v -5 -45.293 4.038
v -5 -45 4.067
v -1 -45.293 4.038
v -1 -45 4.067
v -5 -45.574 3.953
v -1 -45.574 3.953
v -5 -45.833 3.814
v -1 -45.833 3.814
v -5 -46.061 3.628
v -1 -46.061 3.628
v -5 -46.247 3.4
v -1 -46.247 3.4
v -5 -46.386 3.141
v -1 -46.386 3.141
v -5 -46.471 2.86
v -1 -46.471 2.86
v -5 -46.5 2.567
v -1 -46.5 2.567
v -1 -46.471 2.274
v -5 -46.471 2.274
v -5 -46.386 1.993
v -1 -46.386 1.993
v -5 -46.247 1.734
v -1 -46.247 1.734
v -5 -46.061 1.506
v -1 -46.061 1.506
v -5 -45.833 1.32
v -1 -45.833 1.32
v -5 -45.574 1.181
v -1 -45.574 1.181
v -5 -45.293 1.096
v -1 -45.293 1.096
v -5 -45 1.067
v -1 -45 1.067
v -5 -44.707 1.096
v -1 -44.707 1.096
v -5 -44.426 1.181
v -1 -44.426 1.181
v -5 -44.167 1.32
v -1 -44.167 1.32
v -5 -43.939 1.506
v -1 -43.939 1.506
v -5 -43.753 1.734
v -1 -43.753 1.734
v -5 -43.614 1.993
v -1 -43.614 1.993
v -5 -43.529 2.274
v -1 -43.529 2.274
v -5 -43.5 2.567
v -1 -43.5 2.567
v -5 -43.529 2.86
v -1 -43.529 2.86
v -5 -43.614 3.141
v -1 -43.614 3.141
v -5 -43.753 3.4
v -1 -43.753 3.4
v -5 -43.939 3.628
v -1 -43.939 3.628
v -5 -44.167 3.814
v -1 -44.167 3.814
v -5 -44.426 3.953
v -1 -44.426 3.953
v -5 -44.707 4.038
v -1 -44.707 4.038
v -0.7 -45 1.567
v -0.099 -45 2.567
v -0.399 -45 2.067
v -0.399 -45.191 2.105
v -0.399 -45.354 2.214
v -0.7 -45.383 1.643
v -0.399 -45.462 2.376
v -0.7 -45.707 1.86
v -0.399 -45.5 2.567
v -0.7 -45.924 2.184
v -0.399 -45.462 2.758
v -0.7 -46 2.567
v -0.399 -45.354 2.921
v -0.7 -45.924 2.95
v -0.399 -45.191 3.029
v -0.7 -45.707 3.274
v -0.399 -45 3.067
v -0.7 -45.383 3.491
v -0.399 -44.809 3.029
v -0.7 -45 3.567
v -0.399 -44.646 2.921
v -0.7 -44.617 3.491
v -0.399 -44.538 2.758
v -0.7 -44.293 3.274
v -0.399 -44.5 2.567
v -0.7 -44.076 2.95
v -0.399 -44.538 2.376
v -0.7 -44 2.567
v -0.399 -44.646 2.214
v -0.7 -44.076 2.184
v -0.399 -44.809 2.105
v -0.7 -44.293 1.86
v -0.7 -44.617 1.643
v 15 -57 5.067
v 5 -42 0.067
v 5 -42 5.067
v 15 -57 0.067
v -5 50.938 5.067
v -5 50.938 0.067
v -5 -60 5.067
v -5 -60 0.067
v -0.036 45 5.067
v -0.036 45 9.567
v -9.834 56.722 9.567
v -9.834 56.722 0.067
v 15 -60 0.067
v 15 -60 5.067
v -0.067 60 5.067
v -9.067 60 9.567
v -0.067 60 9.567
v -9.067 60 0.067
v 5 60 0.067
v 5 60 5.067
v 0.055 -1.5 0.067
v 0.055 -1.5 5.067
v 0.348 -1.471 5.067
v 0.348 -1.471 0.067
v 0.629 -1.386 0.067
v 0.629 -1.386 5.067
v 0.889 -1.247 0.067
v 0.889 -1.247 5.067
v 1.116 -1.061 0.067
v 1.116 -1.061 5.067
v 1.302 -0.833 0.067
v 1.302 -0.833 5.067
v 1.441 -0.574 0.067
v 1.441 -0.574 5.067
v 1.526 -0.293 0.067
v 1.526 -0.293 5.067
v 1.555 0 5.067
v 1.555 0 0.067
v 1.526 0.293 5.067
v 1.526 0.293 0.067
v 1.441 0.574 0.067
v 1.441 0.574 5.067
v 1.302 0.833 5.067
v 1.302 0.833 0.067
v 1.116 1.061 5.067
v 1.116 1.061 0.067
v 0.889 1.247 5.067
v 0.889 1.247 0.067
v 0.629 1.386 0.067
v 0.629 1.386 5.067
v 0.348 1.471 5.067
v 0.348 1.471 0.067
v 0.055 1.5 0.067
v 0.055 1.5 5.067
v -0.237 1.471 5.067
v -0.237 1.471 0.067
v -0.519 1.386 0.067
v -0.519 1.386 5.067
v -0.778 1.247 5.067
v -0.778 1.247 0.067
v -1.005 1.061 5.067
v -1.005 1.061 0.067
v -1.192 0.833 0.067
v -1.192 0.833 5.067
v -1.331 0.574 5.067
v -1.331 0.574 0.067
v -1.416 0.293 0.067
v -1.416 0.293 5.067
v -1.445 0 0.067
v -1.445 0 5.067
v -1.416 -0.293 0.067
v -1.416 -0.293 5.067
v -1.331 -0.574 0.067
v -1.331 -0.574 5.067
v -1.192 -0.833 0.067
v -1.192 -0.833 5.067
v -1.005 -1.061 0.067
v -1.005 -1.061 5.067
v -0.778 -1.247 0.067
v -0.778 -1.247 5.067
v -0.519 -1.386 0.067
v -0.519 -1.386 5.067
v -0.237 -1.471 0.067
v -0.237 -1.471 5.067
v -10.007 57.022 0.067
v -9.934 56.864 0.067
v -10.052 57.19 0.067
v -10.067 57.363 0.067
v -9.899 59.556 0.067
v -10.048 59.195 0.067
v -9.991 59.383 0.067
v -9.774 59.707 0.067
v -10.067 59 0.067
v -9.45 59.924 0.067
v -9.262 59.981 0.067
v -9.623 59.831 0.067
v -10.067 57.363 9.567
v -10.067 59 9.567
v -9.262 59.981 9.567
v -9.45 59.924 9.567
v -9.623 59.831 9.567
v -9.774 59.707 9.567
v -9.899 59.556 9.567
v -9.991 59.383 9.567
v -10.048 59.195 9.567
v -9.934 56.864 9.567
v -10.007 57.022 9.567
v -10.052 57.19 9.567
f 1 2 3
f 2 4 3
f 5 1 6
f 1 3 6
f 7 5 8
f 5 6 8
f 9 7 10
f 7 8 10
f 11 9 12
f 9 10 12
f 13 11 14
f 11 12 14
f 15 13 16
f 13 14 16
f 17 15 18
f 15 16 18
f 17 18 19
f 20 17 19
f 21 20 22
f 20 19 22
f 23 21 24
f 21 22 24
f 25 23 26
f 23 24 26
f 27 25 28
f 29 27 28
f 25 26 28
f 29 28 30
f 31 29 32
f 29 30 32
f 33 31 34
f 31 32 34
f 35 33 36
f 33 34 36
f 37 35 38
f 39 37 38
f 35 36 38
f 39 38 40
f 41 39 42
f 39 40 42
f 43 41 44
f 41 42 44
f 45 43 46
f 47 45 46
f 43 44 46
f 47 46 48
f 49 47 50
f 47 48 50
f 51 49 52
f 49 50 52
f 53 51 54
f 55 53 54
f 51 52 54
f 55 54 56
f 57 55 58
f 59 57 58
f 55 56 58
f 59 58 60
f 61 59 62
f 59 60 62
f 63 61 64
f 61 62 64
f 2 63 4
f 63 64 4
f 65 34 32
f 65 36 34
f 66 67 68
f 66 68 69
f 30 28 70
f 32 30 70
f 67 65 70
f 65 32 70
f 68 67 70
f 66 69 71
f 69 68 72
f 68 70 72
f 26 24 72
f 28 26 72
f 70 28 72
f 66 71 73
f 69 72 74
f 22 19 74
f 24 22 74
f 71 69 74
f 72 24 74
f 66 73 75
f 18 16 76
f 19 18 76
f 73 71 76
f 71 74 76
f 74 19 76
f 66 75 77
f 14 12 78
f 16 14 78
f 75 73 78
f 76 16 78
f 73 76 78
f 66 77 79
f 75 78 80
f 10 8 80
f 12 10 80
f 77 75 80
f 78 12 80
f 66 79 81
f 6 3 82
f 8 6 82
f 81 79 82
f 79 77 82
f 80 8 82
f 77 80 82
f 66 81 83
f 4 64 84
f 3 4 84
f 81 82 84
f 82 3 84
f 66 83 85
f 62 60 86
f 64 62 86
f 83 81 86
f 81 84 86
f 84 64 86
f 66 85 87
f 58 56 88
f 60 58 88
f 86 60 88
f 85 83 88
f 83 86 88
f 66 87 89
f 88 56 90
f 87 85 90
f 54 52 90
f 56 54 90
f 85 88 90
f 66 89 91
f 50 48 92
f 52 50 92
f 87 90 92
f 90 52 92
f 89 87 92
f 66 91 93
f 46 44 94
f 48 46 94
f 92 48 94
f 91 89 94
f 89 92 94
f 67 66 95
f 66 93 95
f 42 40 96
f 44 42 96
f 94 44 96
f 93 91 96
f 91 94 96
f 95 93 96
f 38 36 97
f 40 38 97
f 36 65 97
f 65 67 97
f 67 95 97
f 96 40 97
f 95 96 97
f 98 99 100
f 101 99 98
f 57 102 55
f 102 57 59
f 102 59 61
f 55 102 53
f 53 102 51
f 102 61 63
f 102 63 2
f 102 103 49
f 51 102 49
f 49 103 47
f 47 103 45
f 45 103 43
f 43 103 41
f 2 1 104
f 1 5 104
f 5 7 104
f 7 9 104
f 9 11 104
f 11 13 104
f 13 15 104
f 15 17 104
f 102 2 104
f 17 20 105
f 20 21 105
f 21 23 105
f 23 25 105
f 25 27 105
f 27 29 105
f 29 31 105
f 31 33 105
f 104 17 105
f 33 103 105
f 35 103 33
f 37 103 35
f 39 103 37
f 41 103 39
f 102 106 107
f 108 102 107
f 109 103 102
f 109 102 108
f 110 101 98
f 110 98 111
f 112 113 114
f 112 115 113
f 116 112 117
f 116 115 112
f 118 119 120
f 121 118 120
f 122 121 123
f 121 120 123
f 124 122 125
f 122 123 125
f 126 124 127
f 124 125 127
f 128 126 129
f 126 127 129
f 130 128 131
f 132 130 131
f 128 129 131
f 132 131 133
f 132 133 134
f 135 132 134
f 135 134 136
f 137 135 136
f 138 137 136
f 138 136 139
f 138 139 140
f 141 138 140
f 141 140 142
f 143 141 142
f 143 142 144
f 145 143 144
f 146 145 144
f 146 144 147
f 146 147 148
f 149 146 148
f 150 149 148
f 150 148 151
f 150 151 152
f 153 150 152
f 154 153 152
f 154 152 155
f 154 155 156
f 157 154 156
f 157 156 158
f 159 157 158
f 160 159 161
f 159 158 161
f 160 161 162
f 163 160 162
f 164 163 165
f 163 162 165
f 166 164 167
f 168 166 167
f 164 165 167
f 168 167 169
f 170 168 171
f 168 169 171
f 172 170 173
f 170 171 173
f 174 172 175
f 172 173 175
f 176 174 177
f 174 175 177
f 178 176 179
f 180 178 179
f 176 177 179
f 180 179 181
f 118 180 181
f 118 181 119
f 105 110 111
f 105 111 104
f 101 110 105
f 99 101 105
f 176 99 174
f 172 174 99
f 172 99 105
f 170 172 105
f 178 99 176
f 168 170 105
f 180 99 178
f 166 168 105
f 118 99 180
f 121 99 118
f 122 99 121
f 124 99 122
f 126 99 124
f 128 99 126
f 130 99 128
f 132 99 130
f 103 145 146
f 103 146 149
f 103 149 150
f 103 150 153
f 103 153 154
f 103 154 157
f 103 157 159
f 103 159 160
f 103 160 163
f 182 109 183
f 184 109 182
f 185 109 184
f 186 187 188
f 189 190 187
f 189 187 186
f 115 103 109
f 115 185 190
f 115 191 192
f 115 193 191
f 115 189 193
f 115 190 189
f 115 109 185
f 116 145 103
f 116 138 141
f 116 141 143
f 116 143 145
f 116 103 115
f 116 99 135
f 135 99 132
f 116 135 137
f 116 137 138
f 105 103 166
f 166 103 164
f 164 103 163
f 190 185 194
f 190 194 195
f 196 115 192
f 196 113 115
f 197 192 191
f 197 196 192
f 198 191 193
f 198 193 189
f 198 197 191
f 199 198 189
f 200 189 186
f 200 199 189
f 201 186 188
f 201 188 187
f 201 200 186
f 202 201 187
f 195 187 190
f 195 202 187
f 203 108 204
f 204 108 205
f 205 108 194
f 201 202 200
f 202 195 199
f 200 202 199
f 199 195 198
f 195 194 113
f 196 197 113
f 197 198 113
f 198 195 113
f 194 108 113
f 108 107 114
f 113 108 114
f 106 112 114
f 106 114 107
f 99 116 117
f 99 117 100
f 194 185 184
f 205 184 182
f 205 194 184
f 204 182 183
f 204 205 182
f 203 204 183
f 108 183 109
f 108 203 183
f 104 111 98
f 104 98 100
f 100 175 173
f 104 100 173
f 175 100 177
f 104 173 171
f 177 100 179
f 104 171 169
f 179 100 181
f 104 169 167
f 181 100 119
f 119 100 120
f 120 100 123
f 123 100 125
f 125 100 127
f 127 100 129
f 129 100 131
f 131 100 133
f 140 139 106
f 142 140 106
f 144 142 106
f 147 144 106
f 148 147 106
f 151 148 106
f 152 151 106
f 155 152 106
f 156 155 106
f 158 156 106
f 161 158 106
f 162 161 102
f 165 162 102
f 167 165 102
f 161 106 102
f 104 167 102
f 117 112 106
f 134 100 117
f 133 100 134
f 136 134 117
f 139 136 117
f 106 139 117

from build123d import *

# Parameters (mm, degrees)
F0_W      = 60
F0_H      = 10
F1_DEPTH  = 5
F4_DEPTH  = 5
F6_DEPTH  = 9.5
F8_D      = 3
F9_R      = 1
F11_D     = 3
F11_DEPTH = 4
F11_TIP   = 0.9012909285
F12_ANGLE = 90


with BuildPart() as f1:
    # F0 (on Right) → F1 (new body)
    with BuildSketch(Plane.YZ):
        with Locations((30, 10.0670714118)):
            Rectangle(F0_W, F0_H)
    extrude(amount=-F1_DEPTH)

    # F2: F1 across plane


with BuildPart() as f1_1:
    add(f1.part)
    add(f1.part.mirror(Plane.XZ))

    # F3 (on Right) → F4 (join)
    with BuildSketch(Plane.YZ):
        Polygon((-60, 25.0670714118), (-60, 15.0670714118), (-42, 15.0670714118), (-57, 25.0670714118), align=None)
    extrude(amount=-F4_DEPTH)

    # F5 (on face) → F6 (join)
    with BuildSketch(Plane.YZ):
        Polygon((60, 10), (45.0000320606, 10.031013164), (57, 0), (60, 0), align=None)
    extrude(amount=-F6_DEPTH)

    # F8 (through all)
    with Locations(Plane.YZ):
        with Locations((0, 10.122266598)):
            Hole(F8_D / 2)

    # F9
    f9_edges = [f1_1.edges().sort_by_distance(p)[0] for p in [
        (-4.75, 57, 0),
        (-4.75, 60, 0),
    ]]
    fillet(f9_edges, radius=F9_R)

    # F11
    with Locations(Plane(origin=(0, 0, 5.0670714118), x_dir=(1, 0, 0), z_dir=(0, 0, -1))):
        with Locations((-2.5, 45)):
            Hole(F11_D / 2, depth=F11_DEPTH)
            with Locations((0, 0, -(F11_DEPTH + F11_TIP / 2))):  # 118° drill point
                Cone(0, F11_D / 2, F11_TIP, mode=Mode.SUBTRACT)


with BuildPart() as f1_2:
    # F12: moved
    add(f1_1.part.rotate(Axis((-5, -4.5308351456, 5.0670714118), (0, 1, 0)), F12_ANGLE))


solid = f1_2.part
